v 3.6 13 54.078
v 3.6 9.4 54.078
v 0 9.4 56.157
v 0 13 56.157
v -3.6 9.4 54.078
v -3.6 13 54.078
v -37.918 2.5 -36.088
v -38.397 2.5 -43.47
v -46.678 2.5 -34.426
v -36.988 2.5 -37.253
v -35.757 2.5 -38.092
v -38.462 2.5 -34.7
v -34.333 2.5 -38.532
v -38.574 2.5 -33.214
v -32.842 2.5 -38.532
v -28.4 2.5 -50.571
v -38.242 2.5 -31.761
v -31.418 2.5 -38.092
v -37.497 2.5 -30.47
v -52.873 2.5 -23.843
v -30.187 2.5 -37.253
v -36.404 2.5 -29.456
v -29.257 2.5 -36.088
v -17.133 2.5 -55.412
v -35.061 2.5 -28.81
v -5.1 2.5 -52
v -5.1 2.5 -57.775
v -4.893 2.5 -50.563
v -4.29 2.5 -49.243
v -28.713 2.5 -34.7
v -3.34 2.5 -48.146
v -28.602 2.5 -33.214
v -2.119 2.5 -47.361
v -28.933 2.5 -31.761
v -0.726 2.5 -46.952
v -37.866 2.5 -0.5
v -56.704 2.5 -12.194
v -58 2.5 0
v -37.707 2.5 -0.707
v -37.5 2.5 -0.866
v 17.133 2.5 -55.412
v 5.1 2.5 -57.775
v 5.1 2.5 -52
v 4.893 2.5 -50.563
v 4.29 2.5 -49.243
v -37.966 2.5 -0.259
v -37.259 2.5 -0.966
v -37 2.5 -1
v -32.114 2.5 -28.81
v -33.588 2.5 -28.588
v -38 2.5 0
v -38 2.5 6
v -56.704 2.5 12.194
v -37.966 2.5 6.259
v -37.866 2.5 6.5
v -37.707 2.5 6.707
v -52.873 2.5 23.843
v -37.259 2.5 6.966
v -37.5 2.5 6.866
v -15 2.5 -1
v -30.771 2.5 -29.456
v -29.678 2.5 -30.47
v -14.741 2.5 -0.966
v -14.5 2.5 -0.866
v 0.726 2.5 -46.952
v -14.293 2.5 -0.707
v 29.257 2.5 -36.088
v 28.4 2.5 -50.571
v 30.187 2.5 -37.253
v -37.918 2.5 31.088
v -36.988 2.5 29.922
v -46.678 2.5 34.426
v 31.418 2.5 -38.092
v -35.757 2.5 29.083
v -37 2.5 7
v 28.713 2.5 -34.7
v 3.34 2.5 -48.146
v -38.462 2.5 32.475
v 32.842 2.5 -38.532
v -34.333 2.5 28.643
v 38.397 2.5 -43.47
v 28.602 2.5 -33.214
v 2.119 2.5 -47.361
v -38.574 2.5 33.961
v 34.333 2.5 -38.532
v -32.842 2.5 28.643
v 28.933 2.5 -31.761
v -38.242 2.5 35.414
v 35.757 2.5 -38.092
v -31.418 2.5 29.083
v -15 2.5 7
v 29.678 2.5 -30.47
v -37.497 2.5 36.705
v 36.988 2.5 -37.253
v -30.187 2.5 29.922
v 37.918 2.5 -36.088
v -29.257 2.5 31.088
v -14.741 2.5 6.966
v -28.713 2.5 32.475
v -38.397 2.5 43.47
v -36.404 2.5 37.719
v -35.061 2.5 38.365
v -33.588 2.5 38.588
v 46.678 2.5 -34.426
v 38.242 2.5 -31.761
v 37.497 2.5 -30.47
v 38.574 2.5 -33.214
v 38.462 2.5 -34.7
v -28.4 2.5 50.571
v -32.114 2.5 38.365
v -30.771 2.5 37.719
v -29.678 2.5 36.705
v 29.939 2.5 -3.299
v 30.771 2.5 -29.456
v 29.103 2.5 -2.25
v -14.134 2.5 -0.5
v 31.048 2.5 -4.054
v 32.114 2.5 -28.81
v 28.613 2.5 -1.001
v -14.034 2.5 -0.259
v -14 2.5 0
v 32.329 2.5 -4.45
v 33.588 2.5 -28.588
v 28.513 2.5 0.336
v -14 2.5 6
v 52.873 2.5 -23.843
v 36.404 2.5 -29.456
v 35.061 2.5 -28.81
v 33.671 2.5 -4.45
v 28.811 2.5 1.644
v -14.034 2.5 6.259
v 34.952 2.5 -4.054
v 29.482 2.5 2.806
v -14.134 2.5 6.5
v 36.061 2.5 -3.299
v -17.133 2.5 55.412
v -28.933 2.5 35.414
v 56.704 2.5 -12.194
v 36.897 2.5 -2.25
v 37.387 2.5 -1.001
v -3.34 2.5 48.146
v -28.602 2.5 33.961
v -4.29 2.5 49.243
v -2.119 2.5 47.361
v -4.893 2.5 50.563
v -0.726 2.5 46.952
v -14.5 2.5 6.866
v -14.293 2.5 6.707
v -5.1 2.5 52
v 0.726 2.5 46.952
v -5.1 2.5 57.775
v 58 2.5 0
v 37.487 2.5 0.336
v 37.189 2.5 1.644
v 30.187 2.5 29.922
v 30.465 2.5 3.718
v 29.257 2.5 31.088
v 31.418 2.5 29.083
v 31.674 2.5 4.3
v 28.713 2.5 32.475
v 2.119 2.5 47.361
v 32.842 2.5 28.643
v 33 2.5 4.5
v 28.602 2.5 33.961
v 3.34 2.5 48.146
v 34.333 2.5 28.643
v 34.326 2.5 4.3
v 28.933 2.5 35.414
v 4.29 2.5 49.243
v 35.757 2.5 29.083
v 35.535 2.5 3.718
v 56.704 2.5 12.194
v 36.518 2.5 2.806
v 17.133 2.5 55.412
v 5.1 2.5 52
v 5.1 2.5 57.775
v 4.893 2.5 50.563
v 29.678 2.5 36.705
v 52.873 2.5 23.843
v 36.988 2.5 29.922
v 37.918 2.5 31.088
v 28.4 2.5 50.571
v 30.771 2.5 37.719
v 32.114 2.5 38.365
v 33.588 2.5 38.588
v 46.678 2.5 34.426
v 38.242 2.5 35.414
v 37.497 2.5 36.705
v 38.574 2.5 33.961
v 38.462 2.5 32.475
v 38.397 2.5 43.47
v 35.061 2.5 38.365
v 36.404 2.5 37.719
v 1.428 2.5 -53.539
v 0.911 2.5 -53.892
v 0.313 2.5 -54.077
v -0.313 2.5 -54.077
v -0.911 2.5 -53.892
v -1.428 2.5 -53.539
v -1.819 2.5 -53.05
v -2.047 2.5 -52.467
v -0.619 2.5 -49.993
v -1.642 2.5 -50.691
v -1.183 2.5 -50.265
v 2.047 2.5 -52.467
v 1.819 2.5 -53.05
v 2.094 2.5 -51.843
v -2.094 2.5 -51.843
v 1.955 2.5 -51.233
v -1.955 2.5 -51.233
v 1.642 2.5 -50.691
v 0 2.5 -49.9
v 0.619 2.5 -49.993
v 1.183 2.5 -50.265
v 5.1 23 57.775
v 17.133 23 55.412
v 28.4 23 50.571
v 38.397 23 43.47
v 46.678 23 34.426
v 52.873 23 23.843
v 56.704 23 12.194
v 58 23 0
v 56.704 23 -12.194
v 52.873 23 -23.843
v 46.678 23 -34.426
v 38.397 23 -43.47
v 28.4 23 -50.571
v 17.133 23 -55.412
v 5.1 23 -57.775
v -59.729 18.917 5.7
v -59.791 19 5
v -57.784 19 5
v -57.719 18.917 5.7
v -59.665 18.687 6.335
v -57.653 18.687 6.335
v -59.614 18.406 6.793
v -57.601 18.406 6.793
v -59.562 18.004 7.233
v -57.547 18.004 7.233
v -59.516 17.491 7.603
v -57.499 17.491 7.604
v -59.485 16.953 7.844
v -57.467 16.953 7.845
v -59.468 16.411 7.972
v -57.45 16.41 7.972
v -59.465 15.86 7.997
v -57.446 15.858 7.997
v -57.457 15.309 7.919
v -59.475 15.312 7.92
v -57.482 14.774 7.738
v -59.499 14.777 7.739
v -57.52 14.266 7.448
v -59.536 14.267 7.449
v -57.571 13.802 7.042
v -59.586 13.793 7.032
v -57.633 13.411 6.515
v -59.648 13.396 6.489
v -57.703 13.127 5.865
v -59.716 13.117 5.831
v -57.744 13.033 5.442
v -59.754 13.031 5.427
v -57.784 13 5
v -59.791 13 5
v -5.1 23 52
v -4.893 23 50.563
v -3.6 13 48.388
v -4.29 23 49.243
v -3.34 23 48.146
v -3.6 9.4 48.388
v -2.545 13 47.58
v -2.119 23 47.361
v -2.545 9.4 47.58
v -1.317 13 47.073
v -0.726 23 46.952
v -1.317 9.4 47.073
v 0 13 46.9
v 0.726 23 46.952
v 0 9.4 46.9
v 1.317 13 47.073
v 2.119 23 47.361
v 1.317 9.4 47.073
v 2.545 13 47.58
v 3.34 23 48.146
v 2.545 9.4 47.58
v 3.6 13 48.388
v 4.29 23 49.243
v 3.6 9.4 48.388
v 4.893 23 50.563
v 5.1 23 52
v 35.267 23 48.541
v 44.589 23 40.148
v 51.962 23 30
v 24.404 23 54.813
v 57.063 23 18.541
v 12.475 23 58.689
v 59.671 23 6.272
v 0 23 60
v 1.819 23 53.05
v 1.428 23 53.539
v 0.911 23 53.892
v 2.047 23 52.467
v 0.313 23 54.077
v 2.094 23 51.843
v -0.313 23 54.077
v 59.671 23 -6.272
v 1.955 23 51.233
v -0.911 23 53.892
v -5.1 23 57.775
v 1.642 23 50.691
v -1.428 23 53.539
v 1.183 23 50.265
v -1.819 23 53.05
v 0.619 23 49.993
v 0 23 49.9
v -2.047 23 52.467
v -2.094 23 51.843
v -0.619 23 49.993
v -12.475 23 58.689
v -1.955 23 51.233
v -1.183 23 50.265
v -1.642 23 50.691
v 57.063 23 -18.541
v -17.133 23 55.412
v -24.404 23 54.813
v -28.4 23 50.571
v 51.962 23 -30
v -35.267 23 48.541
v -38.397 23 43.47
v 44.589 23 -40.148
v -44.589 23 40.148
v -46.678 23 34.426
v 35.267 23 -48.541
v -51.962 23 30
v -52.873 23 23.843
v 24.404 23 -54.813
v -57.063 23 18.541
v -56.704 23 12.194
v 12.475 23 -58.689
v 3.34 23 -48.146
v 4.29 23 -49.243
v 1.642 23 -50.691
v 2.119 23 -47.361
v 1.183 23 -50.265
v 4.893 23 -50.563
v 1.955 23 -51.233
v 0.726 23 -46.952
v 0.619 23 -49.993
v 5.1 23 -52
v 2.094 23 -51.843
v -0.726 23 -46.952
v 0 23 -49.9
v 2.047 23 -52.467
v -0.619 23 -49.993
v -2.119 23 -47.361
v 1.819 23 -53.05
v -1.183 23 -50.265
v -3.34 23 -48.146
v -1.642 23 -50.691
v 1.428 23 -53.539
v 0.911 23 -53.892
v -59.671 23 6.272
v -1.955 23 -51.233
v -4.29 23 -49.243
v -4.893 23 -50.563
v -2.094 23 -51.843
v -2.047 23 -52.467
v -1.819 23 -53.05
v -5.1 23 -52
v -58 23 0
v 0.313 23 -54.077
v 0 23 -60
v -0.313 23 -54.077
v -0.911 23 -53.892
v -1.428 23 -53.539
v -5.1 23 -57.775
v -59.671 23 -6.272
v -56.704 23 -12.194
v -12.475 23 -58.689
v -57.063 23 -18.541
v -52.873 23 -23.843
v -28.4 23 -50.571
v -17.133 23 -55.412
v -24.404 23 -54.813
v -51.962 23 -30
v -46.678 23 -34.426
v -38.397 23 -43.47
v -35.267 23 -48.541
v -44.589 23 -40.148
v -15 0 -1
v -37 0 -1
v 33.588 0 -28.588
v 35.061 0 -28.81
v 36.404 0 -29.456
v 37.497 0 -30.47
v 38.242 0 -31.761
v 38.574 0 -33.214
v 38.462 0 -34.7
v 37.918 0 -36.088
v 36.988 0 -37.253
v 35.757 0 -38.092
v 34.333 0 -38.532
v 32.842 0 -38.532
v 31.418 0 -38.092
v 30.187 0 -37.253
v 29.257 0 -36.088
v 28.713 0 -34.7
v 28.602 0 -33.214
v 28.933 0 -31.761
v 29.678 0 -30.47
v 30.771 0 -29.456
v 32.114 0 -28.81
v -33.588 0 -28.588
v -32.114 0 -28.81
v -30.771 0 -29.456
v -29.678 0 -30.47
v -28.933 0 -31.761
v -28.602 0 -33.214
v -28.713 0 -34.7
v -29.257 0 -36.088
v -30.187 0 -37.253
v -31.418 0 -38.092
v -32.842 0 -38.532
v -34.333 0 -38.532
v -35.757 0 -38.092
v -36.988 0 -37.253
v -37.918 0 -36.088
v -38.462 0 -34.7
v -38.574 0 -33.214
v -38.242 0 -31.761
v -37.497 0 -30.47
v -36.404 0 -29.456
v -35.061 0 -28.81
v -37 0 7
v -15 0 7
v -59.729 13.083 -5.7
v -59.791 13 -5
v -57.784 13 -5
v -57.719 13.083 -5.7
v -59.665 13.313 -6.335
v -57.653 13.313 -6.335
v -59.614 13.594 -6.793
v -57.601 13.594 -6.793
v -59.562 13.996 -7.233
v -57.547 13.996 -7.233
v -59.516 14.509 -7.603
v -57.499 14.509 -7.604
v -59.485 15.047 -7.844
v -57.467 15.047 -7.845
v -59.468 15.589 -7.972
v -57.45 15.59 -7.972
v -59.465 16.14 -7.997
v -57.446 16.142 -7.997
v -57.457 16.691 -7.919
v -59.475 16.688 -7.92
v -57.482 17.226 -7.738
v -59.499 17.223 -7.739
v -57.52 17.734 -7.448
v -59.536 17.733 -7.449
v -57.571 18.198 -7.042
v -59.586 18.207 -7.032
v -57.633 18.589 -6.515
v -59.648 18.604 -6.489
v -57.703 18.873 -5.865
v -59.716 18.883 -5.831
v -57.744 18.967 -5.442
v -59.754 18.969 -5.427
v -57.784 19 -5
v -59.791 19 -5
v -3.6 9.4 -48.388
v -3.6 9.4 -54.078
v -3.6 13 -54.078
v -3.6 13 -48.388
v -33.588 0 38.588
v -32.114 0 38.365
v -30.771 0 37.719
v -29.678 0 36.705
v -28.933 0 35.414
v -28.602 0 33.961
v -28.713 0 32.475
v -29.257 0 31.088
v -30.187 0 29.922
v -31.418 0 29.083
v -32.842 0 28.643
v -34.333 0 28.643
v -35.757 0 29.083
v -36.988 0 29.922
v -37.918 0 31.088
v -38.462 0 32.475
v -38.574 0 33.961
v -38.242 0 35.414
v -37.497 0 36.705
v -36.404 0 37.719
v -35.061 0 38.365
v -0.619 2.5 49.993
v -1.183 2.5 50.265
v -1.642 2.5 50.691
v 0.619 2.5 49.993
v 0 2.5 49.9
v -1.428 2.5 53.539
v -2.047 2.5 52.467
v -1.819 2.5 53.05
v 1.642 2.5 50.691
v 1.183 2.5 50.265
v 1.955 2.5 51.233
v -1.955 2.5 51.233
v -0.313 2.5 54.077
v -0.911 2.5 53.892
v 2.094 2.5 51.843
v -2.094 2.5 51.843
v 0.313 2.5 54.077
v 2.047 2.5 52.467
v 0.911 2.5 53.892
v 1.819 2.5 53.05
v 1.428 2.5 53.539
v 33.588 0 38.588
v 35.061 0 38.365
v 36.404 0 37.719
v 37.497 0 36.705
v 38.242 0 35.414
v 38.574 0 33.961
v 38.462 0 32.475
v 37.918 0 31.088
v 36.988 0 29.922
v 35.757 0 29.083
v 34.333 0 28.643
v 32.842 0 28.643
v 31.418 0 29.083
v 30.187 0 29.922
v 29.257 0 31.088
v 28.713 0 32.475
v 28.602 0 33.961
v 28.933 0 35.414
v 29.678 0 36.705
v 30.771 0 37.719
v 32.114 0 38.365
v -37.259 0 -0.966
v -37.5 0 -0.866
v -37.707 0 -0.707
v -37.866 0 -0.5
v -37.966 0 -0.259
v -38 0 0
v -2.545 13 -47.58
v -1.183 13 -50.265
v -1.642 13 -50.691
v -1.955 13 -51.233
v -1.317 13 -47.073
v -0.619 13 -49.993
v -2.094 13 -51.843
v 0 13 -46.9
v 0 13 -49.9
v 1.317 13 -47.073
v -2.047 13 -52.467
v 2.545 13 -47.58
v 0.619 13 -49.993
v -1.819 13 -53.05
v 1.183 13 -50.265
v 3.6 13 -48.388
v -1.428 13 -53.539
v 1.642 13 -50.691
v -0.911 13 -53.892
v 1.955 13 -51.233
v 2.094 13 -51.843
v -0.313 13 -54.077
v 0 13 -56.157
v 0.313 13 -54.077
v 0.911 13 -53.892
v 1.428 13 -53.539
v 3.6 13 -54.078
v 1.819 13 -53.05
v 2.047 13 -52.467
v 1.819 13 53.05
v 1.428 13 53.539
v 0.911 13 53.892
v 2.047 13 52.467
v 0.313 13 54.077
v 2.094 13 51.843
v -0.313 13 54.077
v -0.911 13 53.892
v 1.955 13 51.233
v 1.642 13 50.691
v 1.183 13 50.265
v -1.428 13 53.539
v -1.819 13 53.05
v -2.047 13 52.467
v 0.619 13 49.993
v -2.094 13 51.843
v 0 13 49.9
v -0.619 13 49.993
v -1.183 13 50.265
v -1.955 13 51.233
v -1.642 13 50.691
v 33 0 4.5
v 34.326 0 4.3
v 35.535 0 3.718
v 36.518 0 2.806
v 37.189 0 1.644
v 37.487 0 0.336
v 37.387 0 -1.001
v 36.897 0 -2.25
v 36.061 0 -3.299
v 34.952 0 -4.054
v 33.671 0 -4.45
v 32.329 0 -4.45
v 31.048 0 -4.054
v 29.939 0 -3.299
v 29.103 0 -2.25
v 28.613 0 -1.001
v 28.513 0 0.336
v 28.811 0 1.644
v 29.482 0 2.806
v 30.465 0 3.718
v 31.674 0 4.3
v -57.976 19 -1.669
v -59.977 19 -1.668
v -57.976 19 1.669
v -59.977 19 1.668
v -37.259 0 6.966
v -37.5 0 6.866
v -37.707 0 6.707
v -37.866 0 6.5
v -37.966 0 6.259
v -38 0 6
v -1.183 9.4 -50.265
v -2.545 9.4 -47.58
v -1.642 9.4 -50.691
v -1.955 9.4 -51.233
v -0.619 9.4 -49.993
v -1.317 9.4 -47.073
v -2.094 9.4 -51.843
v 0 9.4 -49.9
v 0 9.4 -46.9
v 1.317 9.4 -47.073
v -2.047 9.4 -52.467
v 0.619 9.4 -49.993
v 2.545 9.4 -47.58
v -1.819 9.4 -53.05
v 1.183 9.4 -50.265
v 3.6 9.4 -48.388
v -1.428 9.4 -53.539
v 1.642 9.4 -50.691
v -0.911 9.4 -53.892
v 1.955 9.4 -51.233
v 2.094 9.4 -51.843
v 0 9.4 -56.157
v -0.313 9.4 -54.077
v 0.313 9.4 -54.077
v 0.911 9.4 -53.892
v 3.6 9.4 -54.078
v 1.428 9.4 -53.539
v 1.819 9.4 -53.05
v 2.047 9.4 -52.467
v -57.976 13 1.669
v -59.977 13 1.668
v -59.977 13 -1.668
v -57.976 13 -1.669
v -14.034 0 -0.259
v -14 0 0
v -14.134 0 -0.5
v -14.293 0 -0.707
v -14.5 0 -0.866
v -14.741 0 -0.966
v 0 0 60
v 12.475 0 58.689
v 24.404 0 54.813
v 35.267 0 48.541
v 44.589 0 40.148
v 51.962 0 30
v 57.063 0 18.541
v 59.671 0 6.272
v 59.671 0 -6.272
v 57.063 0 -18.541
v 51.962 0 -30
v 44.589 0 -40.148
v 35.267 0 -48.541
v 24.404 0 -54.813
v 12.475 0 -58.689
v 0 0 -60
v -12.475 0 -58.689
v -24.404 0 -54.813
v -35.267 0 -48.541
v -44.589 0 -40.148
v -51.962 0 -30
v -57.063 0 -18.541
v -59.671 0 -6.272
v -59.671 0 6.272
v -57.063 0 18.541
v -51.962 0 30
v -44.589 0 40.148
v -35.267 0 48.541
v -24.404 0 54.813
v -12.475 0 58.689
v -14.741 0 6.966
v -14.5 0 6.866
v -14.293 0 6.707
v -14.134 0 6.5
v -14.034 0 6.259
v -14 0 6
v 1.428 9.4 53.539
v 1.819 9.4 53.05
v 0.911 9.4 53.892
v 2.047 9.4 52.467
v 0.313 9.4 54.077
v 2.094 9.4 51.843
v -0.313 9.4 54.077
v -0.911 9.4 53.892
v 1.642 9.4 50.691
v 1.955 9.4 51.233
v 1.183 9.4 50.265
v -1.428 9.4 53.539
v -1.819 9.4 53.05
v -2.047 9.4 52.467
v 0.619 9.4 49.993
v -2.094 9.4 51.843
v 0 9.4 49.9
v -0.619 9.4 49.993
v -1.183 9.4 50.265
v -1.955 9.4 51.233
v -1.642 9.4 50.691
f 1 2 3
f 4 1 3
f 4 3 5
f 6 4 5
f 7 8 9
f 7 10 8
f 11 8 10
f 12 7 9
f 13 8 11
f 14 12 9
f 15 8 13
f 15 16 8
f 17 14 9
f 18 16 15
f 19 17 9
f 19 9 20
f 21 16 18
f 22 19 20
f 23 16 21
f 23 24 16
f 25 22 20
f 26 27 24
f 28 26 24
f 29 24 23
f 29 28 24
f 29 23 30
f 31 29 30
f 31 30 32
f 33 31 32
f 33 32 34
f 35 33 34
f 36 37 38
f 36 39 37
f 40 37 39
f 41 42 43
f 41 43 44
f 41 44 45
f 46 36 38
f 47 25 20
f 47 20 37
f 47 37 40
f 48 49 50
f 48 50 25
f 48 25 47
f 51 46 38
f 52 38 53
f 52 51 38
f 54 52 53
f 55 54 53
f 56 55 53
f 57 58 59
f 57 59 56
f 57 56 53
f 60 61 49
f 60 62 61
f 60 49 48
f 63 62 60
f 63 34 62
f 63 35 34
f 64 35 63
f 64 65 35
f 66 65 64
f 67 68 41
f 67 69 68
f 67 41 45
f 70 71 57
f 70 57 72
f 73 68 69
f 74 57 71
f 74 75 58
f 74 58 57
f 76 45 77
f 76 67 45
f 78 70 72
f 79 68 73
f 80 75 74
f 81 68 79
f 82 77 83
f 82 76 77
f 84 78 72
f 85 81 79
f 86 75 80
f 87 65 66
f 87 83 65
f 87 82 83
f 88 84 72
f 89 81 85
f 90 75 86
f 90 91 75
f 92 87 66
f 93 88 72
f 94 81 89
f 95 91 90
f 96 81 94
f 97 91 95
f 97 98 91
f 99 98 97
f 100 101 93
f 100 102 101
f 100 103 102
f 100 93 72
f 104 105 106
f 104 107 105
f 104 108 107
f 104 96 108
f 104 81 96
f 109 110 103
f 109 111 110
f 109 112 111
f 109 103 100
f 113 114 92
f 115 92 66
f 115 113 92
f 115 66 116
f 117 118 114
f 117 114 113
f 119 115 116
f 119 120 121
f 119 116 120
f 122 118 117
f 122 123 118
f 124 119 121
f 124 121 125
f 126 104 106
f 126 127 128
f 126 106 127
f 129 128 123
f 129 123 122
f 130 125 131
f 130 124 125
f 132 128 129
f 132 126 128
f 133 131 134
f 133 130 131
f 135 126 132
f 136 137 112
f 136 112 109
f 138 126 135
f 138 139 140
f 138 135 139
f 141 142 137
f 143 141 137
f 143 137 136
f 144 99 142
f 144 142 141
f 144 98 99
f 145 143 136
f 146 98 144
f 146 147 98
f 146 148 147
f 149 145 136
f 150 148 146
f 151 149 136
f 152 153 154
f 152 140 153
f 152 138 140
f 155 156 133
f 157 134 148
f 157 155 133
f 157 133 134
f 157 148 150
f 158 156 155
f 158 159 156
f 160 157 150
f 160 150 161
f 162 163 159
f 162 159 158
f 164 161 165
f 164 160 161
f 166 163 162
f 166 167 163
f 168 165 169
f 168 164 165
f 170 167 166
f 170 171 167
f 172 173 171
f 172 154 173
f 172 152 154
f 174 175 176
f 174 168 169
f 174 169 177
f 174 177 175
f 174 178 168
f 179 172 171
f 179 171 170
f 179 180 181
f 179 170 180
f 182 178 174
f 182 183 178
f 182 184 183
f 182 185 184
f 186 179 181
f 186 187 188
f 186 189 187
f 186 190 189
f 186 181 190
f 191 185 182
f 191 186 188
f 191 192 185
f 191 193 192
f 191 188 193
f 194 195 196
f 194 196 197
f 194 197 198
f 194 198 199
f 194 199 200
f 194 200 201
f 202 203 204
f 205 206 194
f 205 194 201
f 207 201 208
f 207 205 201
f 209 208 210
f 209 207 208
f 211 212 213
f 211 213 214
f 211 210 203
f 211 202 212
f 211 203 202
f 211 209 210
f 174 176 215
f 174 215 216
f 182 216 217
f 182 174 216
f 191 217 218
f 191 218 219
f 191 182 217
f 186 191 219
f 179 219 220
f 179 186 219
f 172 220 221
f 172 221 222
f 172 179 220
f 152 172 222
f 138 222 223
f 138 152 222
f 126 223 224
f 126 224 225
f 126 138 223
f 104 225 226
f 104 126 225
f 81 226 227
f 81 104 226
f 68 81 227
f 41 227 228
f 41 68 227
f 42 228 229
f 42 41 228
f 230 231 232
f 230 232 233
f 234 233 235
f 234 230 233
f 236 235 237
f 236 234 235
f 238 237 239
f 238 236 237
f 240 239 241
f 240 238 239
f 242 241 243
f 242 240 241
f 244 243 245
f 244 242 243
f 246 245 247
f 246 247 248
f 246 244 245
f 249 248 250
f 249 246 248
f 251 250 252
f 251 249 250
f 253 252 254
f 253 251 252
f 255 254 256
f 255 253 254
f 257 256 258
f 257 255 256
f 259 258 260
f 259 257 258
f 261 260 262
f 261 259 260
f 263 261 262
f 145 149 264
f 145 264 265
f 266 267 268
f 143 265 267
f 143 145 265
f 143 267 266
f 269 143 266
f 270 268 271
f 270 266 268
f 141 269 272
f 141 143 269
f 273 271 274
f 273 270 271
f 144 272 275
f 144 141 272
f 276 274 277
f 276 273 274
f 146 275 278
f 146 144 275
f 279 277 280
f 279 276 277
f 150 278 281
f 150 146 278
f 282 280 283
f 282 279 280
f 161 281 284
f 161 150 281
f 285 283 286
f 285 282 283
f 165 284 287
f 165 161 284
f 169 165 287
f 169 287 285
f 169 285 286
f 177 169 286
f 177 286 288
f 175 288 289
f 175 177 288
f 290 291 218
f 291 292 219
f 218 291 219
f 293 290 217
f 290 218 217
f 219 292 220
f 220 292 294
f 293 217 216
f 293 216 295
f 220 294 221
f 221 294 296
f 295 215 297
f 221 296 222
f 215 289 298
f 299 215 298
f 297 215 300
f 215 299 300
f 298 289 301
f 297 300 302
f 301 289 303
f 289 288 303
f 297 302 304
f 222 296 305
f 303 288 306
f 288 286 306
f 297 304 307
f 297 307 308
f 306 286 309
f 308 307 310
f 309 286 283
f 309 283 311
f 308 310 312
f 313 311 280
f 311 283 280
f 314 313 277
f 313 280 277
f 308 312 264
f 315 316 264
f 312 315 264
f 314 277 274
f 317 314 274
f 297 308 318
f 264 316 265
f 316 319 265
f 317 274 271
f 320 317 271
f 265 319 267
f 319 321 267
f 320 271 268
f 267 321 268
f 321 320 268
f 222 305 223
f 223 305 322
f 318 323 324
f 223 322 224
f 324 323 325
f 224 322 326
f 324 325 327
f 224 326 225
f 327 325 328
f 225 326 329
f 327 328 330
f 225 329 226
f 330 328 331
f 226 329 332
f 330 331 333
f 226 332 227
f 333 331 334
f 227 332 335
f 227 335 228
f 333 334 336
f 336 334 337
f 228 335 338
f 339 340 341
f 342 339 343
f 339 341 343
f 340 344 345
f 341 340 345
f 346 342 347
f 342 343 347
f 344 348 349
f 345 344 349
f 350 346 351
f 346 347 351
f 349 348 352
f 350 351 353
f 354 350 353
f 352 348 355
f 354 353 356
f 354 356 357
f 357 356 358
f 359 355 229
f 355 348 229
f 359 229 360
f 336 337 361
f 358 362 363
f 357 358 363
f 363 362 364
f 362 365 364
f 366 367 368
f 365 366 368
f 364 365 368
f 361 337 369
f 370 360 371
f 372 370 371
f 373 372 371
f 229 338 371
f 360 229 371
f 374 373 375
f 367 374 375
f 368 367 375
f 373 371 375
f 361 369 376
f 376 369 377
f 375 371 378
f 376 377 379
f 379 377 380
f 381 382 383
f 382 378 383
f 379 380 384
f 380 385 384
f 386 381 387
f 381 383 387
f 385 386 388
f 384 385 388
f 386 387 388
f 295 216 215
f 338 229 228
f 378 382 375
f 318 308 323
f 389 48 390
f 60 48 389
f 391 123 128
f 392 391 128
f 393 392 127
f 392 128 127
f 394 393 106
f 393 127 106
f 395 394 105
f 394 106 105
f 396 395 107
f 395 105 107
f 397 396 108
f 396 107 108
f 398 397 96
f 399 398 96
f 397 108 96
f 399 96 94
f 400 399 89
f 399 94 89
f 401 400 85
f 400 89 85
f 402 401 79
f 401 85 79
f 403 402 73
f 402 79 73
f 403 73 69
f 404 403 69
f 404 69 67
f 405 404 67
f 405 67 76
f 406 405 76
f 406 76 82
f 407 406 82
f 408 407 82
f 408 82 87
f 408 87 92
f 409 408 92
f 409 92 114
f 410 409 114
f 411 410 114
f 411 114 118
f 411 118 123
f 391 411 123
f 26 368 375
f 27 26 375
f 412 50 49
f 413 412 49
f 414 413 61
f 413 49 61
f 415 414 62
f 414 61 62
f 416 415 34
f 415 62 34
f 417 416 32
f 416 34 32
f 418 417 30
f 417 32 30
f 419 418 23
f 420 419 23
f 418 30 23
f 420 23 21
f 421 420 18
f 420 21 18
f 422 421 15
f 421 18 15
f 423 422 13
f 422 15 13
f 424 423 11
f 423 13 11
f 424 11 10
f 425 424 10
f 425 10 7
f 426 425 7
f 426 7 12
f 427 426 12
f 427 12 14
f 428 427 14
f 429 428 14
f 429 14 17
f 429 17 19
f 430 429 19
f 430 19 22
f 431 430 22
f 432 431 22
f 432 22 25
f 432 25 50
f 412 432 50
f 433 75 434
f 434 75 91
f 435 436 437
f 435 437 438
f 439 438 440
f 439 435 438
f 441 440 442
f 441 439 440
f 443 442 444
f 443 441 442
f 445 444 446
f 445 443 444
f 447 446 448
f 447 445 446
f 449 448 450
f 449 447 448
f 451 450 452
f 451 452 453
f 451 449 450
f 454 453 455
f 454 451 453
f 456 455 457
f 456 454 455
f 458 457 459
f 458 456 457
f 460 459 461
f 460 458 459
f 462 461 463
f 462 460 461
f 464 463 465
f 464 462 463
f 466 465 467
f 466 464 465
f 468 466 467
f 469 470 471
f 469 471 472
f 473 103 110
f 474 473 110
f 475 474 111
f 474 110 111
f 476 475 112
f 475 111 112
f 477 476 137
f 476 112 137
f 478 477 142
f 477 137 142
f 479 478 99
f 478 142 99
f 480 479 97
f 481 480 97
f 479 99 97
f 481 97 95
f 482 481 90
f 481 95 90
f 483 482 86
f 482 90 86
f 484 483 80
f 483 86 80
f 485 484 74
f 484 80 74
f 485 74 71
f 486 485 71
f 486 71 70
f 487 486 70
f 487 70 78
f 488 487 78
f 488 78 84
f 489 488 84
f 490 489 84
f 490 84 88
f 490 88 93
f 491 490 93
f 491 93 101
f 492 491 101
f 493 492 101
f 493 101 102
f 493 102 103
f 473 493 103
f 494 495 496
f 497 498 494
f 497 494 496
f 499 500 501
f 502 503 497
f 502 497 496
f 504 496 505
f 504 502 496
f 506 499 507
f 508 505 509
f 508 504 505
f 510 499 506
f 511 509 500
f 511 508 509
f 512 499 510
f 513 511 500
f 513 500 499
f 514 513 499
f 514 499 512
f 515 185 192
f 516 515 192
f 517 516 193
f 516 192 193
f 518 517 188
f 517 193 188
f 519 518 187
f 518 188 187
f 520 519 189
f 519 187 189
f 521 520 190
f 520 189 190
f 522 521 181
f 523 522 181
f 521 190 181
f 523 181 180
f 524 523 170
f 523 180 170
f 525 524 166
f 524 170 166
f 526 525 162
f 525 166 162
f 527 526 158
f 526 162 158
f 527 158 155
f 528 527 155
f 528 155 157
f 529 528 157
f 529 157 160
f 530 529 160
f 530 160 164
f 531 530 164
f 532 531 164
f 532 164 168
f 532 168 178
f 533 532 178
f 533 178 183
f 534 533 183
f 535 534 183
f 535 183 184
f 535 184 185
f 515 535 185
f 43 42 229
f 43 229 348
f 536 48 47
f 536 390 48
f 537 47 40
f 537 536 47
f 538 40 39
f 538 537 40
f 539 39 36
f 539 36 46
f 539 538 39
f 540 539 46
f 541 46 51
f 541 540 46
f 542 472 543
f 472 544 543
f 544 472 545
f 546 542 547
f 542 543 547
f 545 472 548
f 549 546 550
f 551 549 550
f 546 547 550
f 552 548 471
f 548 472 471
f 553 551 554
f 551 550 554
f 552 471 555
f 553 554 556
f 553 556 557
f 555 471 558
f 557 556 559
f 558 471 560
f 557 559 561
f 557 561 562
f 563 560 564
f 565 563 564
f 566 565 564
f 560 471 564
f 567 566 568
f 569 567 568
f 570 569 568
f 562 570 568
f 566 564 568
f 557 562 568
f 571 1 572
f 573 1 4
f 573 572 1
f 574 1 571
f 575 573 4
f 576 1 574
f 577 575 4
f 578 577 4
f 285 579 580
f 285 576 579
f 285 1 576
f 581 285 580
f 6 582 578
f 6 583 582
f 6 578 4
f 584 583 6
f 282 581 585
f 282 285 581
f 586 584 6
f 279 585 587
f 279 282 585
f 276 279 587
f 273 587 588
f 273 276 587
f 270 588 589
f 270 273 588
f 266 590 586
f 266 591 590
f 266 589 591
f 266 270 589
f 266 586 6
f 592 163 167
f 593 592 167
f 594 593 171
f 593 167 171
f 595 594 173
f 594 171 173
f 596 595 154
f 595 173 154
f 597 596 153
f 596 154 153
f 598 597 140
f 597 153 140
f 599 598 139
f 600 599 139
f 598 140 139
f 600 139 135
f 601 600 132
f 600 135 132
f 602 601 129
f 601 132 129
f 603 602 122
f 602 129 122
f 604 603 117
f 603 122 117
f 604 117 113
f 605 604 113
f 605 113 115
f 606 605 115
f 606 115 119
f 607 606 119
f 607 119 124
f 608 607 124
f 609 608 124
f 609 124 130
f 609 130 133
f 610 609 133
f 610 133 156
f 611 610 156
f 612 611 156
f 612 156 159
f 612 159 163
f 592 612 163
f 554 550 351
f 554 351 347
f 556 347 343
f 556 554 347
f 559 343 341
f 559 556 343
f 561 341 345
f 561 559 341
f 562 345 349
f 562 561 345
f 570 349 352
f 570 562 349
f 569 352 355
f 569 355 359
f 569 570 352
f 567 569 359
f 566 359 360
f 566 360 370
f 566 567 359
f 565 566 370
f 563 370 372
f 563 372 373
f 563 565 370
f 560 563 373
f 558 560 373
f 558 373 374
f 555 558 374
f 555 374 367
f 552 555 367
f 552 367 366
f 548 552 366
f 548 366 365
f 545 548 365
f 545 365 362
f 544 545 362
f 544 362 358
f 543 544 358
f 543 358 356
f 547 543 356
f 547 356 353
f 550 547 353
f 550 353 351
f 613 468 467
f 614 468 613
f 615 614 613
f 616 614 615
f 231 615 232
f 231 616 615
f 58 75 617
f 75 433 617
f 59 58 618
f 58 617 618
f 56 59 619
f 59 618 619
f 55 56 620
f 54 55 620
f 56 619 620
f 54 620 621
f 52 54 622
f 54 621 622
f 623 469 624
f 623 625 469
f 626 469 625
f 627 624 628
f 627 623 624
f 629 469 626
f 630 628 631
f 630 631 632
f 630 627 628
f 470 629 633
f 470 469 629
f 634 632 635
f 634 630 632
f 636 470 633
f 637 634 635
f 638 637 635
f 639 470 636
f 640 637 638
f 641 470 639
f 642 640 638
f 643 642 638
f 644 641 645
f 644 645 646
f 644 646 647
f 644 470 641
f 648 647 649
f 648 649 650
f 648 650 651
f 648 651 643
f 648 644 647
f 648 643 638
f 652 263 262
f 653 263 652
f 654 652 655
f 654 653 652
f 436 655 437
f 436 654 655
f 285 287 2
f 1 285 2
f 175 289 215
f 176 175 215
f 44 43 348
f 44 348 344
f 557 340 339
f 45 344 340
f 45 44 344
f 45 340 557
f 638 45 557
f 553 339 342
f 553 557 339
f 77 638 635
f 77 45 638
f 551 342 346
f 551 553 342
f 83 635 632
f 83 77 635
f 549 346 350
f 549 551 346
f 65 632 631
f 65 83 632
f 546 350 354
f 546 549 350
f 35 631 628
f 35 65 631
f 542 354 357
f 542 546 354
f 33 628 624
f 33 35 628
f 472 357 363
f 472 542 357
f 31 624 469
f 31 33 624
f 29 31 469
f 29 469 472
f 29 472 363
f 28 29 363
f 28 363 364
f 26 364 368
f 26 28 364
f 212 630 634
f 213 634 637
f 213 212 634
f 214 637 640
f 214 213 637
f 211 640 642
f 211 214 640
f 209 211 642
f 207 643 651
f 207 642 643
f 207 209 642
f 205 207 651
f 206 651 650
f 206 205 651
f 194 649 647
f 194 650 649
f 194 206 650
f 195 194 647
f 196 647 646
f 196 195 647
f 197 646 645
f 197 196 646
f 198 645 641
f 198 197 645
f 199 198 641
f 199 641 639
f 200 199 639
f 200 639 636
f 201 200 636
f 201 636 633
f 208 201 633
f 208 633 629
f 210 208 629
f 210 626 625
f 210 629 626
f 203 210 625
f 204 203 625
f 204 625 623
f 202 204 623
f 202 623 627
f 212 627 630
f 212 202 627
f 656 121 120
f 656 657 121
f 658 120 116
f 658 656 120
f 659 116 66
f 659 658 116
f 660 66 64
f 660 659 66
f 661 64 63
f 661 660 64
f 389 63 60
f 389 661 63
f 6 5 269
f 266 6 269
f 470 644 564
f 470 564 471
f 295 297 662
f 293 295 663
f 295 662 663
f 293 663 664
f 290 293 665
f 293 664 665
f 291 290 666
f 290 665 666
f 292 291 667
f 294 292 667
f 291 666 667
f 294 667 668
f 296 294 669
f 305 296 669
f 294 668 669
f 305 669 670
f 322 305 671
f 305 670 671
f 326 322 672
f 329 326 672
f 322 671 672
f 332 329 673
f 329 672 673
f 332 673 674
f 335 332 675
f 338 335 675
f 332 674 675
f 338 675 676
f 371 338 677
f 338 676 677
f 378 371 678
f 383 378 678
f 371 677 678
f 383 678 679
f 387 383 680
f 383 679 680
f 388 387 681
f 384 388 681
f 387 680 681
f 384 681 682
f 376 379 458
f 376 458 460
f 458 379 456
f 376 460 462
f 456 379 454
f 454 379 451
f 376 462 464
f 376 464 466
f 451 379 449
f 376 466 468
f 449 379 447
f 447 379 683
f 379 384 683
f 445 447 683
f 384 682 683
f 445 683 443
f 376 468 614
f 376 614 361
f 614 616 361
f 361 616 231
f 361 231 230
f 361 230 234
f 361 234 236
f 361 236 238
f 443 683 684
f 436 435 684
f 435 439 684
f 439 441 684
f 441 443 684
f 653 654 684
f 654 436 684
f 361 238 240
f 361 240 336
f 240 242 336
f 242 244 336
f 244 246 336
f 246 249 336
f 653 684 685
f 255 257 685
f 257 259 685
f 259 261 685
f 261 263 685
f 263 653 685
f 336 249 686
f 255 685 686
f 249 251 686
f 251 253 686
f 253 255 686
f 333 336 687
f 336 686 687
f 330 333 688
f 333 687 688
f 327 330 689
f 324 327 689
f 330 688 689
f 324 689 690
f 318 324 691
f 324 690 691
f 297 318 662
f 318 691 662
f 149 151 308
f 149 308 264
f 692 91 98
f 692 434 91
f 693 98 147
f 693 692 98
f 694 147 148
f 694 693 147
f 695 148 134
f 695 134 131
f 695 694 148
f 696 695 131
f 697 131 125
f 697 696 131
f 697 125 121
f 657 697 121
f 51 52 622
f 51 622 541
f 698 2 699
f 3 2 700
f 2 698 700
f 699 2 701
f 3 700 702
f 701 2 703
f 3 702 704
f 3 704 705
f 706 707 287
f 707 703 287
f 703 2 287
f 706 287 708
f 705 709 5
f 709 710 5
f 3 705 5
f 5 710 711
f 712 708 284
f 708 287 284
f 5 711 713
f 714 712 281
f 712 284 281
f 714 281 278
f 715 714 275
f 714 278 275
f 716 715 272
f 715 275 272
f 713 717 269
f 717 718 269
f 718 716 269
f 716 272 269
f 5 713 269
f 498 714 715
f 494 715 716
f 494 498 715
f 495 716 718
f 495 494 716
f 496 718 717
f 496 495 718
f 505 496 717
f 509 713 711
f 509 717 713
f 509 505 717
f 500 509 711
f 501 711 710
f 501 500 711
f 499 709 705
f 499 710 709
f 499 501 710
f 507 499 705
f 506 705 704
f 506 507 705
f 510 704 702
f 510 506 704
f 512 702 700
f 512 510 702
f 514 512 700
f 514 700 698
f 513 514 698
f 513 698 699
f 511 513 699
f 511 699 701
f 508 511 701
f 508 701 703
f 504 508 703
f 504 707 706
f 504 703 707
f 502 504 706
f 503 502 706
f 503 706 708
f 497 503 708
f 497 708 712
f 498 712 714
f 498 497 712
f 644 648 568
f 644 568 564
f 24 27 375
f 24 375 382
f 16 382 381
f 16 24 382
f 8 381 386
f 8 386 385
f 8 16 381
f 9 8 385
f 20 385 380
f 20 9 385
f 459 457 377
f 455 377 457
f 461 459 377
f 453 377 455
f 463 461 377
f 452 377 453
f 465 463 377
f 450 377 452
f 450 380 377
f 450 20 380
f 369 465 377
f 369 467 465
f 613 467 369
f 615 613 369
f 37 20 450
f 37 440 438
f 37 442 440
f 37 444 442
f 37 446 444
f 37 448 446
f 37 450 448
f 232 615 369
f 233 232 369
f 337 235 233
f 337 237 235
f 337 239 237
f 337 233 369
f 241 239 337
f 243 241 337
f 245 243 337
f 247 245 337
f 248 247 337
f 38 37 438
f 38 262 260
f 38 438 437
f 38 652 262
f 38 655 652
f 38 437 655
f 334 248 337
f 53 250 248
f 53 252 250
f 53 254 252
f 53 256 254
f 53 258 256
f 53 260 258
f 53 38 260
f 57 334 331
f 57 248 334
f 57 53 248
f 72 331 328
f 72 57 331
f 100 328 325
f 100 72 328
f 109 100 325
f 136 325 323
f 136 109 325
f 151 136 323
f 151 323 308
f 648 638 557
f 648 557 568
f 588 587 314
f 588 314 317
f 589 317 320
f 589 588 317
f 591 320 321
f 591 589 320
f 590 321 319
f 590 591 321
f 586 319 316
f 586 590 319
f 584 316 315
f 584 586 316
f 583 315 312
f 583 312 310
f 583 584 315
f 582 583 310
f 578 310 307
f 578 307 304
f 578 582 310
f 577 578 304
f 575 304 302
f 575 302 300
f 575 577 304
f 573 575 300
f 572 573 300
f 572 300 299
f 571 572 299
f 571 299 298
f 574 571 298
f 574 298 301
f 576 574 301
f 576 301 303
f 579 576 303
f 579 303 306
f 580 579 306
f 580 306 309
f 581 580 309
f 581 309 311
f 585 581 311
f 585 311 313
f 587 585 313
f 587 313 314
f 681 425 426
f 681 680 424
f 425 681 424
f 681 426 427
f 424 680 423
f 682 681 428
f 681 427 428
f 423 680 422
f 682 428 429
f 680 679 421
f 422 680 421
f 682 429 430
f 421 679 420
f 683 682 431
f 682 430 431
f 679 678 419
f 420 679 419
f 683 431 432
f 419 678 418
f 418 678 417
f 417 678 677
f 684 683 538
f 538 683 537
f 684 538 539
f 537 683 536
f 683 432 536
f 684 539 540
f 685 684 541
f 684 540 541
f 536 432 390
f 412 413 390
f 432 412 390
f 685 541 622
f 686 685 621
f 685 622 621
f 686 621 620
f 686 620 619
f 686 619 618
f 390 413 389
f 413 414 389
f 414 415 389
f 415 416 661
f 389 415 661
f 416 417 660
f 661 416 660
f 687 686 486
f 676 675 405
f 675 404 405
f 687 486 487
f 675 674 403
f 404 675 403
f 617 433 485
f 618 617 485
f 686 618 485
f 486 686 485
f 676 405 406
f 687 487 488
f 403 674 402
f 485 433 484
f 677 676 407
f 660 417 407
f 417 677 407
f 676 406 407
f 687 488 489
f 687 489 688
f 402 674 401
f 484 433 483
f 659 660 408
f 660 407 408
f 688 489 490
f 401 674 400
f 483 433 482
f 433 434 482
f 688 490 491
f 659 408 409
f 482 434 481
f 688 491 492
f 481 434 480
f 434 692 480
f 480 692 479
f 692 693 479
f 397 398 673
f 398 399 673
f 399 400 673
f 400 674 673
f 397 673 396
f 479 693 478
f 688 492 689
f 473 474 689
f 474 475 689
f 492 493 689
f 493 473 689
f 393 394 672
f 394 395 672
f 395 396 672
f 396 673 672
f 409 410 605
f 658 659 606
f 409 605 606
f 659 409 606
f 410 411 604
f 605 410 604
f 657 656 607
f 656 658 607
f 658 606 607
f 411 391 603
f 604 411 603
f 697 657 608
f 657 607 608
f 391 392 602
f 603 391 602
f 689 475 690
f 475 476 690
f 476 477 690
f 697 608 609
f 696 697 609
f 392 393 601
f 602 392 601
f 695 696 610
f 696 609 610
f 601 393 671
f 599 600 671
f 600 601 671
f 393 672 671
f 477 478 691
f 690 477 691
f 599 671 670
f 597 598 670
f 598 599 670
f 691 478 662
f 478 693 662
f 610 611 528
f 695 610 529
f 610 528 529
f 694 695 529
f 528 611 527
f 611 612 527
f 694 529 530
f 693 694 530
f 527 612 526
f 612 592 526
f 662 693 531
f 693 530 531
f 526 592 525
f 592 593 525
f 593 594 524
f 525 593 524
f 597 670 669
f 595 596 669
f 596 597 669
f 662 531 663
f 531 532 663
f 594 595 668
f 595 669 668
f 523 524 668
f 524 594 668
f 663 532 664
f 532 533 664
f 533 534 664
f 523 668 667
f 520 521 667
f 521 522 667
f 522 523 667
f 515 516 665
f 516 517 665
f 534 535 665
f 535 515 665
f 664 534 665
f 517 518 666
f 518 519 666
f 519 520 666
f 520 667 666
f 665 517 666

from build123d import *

# Parameters (mm, degrees)
SKETCH1_R               = 60
BOSS_EXTRUDE1_DEPTH     = 2.5
SKETCH2_R               = 60
SKETCH2_R_2             = 58
BOSS_EXTRUDE2_DEPTH     = 20.5
SKETCH3_R               = 4.5
SKETCH3_R_2             = 5
CUT_EXTRUDE1_DEPTH      = 88.294043325
SKETCH4_W               = 24
SKETCH4_H               = 8
CUT_EXTRUDE2_DEPTH      = 88.294043325
FILLET1_R               = 1
SKETCH5_R               = 2.1
BOSS_EXTRUDE3_DEPTH     = 20.5
CUT_EXTRUDE3_START      = -3.6
CUT_EXTRUDE3_DEPTH      = 3.6
CUT_EXTRUDE4_REACH      = 138.121
CUT_EXTRUDE4_END_RADIUS = 58


with BuildPart() as part:
    # Sketch1 → Boss-Extrude1 (new body)
    with BuildSketch(Plane(origin=(0, 0, 0), x_dir=(1, 0, 0), z_dir=(0, 1, 0))):
        with Locations(Location((0, 0, 0), (0, 0, 270))):
            Circle(SKETCH1_R)
    extrude(amount=BOSS_EXTRUDE1_DEPTH)

    # Sketch2 → Boss-Extrude2 (add)
    with BuildSketch(Plane(origin=(0, 2.5, 0), x_dir=(1, 0, 0), z_dir=(0, 1, 0))):
        with Locations(Location((0, 0, 0), (0, 0, 270))):
            Circle(SKETCH2_R)
        with Locations(Location((0, 0, 0), (0, 0, 270))):
            Circle(SKETCH2_R_2, mode=Mode.SUBTRACT)
    extrude(amount=BOSS_EXTRUDE2_DEPTH)

    # Sketch3 → Cut-Extrude1 (cut, through all)
    with BuildSketch(Plane(origin=(0, 2.5, 0), x_dir=(1, 0, 0), z_dir=(0, 1, 0))):
        with Locations(Location((33, 0, 0), (0, 0, 270))):
            Circle(SKETCH3_R)
        with Locations(Location((33.587572106, 33.587572106, 0), (0, 0, 270))):
            Circle(SKETCH3_R_2)
        with Locations(Location((33.587572106, -33.587572106, 0), (0, 0, 270))):
            Circle(SKETCH3_R_2)
        with Locations(Location((-33.587572106, -33.587572106, 0), (0, 0, 270))):
            Circle(SKETCH3_R_2)
        with Locations(Location((-33.587572106, 33.587572106, 0), (0, 0, 270))):
            Circle(SKETCH3_R_2)
    extrude(amount=-CUT_EXTRUDE1_DEPTH, mode=Mode.SUBTRACT)

    # Sketch4 → Cut-Extrude2 (cut, through all)
    with BuildSketch(Plane(origin=(0, 2.5, 0), x_dir=(1, 0, 0), z_dir=(0, 1, 0))):
        with Locations((-26, -3)):
            Rectangle(SKETCH4_W, SKETCH4_H)
    extrude(amount=-CUT_EXTRUDE2_DEPTH, mode=Mode.SUBTRACT)

    # Fillet1
    fillet1_edges = [part.edges().sort_by_distance(p)[0] for p in [
        (-38, 1.25, 7),
        (-38, 1.25, -1),
        (-14, 1.25, -1),
        (-14, 1.25, 7),
    ]]
    fillet(fillet1_edges, radius=FILLET1_R)

    # Sketch5 → Boss-Extrude3 (add, through all)
    # profile 1 of 2: a face of its own
    with BuildSketch(Plane(origin=(0, 2.5, 0), x_dir=(1, 0, 0), z_dir=(0, 1, 0))):
        with BuildLine():
            Line((-5.1, 52), (-5.1, 57.775340761))
            ThreePointArc((-5.1, 57.775340761), (0, 58), (5.1, 57.775340761))
            Line((5.1, 57.775340761), (5.1, 52))
            ThreePointArc((5.1, 52), (0, 46.9), (-5.1, 52))
        make_face()
        with Locations(Location((0, 52, 0), (0, 0, 270))):
            Circle(SKETCH5_R, mode=Mode.SUBTRACT)
    # profile 2 of 2: a face of its own
    with BuildSketch(Plane(origin=(0, 2.5, 0), x_dir=(1, 0, 0), z_dir=(0, 1, 0))):
        with BuildLine():
            Line((5.1, -52), (5.1, -57.775340761))
            ThreePointArc((5.1, -57.775340761), (0, -58), (-5.1, -57.775340761))
            Line((-5.1, -57.775340761), (-5.1, -52))
            ThreePointArc((-5.1, -52), (0, -46.9), (5.1, -52))
        make_face()
        with Locations(Location((0, -52, 0), (0, 0, 90))):
            Circle(SKETCH5_R, mode=Mode.SUBTRACT)
    extrude(amount=BOSS_EXTRUDE3_DEPTH)

    # Sketch6 → Cut-Extrude3 (cut)
    with BuildSketch(Plane(origin=(0, 13, 0), x_dir=(1, 0, 0), z_dir=(0, 1, 0)).offset(CUT_EXTRUDE3_START)):
        with BuildLine():
            Line((3.6, 54.078460969), (0, 56.156921938))
            Line((0, 56.156921938), (-3.6, 54.078460969))
            Line((-3.6, 54.078460969), (-3.6, 48.387521626))
            ThreePointArc((-3.6, 48.387521626), (0, 46.9), (3.6, 48.387521626))
            Line((3.6, 48.387521626), (3.6, 54.078460969))
        make_face()
        with BuildLine():
            Line((3.6, -48.387521626), (3.6, -54.078460969))
            Line((3.6, -54.078460969), (0, -56.156921938))
            Line((0, -56.156921938), (-3.6, -54.078460969))
            Line((-3.6, -54.078460969), (-3.6, -48.387521626))
            ThreePointArc((-3.6, -48.387521626), (0, -46.9), (3.6, -48.387521626))
        make_face()
    extrude(amount=CUT_EXTRUDE3_DEPTH, mode=Mode.SUBTRACT)

    # Cut-Extrude4: up to this cylinder (the profile starts outside it)
    cut_extrude4_end = Plane(origin=(0, 16, 0), z_dir=(0, -1, 0)) * Cylinder(CUT_EXTRUDE4_END_RADIUS, 393.242, mode=Mode.PRIVATE)
    # Sketch7 → Cut-Extrude4 (cut, up to the surface)
    with BuildSketch(Plane.ZY.offset(60), mode=Mode.PRIVATE) as cut_extrude4_sk1:
        with BuildLine():
            Line((-5, 19), (5, 19))
            ThreePointArc((5, 19), (8, 16), (5, 13))
            Line((5, 13), (-5, 13))
            ThreePointArc((-5, 13), (-8, 16), (-5, 19))
        make_face()
    cut_extrude4_tool1 = extrude(cut_extrude4_sk1.sketch, amount=-CUT_EXTRUDE4_REACH, mode=Mode.PRIVATE) - cut_extrude4_end
    add(cut_extrude4_tool1.solids().sort_by_distance((-60, 16, 0))[0], mode=Mode.SUBTRACT)


solid = part.part
